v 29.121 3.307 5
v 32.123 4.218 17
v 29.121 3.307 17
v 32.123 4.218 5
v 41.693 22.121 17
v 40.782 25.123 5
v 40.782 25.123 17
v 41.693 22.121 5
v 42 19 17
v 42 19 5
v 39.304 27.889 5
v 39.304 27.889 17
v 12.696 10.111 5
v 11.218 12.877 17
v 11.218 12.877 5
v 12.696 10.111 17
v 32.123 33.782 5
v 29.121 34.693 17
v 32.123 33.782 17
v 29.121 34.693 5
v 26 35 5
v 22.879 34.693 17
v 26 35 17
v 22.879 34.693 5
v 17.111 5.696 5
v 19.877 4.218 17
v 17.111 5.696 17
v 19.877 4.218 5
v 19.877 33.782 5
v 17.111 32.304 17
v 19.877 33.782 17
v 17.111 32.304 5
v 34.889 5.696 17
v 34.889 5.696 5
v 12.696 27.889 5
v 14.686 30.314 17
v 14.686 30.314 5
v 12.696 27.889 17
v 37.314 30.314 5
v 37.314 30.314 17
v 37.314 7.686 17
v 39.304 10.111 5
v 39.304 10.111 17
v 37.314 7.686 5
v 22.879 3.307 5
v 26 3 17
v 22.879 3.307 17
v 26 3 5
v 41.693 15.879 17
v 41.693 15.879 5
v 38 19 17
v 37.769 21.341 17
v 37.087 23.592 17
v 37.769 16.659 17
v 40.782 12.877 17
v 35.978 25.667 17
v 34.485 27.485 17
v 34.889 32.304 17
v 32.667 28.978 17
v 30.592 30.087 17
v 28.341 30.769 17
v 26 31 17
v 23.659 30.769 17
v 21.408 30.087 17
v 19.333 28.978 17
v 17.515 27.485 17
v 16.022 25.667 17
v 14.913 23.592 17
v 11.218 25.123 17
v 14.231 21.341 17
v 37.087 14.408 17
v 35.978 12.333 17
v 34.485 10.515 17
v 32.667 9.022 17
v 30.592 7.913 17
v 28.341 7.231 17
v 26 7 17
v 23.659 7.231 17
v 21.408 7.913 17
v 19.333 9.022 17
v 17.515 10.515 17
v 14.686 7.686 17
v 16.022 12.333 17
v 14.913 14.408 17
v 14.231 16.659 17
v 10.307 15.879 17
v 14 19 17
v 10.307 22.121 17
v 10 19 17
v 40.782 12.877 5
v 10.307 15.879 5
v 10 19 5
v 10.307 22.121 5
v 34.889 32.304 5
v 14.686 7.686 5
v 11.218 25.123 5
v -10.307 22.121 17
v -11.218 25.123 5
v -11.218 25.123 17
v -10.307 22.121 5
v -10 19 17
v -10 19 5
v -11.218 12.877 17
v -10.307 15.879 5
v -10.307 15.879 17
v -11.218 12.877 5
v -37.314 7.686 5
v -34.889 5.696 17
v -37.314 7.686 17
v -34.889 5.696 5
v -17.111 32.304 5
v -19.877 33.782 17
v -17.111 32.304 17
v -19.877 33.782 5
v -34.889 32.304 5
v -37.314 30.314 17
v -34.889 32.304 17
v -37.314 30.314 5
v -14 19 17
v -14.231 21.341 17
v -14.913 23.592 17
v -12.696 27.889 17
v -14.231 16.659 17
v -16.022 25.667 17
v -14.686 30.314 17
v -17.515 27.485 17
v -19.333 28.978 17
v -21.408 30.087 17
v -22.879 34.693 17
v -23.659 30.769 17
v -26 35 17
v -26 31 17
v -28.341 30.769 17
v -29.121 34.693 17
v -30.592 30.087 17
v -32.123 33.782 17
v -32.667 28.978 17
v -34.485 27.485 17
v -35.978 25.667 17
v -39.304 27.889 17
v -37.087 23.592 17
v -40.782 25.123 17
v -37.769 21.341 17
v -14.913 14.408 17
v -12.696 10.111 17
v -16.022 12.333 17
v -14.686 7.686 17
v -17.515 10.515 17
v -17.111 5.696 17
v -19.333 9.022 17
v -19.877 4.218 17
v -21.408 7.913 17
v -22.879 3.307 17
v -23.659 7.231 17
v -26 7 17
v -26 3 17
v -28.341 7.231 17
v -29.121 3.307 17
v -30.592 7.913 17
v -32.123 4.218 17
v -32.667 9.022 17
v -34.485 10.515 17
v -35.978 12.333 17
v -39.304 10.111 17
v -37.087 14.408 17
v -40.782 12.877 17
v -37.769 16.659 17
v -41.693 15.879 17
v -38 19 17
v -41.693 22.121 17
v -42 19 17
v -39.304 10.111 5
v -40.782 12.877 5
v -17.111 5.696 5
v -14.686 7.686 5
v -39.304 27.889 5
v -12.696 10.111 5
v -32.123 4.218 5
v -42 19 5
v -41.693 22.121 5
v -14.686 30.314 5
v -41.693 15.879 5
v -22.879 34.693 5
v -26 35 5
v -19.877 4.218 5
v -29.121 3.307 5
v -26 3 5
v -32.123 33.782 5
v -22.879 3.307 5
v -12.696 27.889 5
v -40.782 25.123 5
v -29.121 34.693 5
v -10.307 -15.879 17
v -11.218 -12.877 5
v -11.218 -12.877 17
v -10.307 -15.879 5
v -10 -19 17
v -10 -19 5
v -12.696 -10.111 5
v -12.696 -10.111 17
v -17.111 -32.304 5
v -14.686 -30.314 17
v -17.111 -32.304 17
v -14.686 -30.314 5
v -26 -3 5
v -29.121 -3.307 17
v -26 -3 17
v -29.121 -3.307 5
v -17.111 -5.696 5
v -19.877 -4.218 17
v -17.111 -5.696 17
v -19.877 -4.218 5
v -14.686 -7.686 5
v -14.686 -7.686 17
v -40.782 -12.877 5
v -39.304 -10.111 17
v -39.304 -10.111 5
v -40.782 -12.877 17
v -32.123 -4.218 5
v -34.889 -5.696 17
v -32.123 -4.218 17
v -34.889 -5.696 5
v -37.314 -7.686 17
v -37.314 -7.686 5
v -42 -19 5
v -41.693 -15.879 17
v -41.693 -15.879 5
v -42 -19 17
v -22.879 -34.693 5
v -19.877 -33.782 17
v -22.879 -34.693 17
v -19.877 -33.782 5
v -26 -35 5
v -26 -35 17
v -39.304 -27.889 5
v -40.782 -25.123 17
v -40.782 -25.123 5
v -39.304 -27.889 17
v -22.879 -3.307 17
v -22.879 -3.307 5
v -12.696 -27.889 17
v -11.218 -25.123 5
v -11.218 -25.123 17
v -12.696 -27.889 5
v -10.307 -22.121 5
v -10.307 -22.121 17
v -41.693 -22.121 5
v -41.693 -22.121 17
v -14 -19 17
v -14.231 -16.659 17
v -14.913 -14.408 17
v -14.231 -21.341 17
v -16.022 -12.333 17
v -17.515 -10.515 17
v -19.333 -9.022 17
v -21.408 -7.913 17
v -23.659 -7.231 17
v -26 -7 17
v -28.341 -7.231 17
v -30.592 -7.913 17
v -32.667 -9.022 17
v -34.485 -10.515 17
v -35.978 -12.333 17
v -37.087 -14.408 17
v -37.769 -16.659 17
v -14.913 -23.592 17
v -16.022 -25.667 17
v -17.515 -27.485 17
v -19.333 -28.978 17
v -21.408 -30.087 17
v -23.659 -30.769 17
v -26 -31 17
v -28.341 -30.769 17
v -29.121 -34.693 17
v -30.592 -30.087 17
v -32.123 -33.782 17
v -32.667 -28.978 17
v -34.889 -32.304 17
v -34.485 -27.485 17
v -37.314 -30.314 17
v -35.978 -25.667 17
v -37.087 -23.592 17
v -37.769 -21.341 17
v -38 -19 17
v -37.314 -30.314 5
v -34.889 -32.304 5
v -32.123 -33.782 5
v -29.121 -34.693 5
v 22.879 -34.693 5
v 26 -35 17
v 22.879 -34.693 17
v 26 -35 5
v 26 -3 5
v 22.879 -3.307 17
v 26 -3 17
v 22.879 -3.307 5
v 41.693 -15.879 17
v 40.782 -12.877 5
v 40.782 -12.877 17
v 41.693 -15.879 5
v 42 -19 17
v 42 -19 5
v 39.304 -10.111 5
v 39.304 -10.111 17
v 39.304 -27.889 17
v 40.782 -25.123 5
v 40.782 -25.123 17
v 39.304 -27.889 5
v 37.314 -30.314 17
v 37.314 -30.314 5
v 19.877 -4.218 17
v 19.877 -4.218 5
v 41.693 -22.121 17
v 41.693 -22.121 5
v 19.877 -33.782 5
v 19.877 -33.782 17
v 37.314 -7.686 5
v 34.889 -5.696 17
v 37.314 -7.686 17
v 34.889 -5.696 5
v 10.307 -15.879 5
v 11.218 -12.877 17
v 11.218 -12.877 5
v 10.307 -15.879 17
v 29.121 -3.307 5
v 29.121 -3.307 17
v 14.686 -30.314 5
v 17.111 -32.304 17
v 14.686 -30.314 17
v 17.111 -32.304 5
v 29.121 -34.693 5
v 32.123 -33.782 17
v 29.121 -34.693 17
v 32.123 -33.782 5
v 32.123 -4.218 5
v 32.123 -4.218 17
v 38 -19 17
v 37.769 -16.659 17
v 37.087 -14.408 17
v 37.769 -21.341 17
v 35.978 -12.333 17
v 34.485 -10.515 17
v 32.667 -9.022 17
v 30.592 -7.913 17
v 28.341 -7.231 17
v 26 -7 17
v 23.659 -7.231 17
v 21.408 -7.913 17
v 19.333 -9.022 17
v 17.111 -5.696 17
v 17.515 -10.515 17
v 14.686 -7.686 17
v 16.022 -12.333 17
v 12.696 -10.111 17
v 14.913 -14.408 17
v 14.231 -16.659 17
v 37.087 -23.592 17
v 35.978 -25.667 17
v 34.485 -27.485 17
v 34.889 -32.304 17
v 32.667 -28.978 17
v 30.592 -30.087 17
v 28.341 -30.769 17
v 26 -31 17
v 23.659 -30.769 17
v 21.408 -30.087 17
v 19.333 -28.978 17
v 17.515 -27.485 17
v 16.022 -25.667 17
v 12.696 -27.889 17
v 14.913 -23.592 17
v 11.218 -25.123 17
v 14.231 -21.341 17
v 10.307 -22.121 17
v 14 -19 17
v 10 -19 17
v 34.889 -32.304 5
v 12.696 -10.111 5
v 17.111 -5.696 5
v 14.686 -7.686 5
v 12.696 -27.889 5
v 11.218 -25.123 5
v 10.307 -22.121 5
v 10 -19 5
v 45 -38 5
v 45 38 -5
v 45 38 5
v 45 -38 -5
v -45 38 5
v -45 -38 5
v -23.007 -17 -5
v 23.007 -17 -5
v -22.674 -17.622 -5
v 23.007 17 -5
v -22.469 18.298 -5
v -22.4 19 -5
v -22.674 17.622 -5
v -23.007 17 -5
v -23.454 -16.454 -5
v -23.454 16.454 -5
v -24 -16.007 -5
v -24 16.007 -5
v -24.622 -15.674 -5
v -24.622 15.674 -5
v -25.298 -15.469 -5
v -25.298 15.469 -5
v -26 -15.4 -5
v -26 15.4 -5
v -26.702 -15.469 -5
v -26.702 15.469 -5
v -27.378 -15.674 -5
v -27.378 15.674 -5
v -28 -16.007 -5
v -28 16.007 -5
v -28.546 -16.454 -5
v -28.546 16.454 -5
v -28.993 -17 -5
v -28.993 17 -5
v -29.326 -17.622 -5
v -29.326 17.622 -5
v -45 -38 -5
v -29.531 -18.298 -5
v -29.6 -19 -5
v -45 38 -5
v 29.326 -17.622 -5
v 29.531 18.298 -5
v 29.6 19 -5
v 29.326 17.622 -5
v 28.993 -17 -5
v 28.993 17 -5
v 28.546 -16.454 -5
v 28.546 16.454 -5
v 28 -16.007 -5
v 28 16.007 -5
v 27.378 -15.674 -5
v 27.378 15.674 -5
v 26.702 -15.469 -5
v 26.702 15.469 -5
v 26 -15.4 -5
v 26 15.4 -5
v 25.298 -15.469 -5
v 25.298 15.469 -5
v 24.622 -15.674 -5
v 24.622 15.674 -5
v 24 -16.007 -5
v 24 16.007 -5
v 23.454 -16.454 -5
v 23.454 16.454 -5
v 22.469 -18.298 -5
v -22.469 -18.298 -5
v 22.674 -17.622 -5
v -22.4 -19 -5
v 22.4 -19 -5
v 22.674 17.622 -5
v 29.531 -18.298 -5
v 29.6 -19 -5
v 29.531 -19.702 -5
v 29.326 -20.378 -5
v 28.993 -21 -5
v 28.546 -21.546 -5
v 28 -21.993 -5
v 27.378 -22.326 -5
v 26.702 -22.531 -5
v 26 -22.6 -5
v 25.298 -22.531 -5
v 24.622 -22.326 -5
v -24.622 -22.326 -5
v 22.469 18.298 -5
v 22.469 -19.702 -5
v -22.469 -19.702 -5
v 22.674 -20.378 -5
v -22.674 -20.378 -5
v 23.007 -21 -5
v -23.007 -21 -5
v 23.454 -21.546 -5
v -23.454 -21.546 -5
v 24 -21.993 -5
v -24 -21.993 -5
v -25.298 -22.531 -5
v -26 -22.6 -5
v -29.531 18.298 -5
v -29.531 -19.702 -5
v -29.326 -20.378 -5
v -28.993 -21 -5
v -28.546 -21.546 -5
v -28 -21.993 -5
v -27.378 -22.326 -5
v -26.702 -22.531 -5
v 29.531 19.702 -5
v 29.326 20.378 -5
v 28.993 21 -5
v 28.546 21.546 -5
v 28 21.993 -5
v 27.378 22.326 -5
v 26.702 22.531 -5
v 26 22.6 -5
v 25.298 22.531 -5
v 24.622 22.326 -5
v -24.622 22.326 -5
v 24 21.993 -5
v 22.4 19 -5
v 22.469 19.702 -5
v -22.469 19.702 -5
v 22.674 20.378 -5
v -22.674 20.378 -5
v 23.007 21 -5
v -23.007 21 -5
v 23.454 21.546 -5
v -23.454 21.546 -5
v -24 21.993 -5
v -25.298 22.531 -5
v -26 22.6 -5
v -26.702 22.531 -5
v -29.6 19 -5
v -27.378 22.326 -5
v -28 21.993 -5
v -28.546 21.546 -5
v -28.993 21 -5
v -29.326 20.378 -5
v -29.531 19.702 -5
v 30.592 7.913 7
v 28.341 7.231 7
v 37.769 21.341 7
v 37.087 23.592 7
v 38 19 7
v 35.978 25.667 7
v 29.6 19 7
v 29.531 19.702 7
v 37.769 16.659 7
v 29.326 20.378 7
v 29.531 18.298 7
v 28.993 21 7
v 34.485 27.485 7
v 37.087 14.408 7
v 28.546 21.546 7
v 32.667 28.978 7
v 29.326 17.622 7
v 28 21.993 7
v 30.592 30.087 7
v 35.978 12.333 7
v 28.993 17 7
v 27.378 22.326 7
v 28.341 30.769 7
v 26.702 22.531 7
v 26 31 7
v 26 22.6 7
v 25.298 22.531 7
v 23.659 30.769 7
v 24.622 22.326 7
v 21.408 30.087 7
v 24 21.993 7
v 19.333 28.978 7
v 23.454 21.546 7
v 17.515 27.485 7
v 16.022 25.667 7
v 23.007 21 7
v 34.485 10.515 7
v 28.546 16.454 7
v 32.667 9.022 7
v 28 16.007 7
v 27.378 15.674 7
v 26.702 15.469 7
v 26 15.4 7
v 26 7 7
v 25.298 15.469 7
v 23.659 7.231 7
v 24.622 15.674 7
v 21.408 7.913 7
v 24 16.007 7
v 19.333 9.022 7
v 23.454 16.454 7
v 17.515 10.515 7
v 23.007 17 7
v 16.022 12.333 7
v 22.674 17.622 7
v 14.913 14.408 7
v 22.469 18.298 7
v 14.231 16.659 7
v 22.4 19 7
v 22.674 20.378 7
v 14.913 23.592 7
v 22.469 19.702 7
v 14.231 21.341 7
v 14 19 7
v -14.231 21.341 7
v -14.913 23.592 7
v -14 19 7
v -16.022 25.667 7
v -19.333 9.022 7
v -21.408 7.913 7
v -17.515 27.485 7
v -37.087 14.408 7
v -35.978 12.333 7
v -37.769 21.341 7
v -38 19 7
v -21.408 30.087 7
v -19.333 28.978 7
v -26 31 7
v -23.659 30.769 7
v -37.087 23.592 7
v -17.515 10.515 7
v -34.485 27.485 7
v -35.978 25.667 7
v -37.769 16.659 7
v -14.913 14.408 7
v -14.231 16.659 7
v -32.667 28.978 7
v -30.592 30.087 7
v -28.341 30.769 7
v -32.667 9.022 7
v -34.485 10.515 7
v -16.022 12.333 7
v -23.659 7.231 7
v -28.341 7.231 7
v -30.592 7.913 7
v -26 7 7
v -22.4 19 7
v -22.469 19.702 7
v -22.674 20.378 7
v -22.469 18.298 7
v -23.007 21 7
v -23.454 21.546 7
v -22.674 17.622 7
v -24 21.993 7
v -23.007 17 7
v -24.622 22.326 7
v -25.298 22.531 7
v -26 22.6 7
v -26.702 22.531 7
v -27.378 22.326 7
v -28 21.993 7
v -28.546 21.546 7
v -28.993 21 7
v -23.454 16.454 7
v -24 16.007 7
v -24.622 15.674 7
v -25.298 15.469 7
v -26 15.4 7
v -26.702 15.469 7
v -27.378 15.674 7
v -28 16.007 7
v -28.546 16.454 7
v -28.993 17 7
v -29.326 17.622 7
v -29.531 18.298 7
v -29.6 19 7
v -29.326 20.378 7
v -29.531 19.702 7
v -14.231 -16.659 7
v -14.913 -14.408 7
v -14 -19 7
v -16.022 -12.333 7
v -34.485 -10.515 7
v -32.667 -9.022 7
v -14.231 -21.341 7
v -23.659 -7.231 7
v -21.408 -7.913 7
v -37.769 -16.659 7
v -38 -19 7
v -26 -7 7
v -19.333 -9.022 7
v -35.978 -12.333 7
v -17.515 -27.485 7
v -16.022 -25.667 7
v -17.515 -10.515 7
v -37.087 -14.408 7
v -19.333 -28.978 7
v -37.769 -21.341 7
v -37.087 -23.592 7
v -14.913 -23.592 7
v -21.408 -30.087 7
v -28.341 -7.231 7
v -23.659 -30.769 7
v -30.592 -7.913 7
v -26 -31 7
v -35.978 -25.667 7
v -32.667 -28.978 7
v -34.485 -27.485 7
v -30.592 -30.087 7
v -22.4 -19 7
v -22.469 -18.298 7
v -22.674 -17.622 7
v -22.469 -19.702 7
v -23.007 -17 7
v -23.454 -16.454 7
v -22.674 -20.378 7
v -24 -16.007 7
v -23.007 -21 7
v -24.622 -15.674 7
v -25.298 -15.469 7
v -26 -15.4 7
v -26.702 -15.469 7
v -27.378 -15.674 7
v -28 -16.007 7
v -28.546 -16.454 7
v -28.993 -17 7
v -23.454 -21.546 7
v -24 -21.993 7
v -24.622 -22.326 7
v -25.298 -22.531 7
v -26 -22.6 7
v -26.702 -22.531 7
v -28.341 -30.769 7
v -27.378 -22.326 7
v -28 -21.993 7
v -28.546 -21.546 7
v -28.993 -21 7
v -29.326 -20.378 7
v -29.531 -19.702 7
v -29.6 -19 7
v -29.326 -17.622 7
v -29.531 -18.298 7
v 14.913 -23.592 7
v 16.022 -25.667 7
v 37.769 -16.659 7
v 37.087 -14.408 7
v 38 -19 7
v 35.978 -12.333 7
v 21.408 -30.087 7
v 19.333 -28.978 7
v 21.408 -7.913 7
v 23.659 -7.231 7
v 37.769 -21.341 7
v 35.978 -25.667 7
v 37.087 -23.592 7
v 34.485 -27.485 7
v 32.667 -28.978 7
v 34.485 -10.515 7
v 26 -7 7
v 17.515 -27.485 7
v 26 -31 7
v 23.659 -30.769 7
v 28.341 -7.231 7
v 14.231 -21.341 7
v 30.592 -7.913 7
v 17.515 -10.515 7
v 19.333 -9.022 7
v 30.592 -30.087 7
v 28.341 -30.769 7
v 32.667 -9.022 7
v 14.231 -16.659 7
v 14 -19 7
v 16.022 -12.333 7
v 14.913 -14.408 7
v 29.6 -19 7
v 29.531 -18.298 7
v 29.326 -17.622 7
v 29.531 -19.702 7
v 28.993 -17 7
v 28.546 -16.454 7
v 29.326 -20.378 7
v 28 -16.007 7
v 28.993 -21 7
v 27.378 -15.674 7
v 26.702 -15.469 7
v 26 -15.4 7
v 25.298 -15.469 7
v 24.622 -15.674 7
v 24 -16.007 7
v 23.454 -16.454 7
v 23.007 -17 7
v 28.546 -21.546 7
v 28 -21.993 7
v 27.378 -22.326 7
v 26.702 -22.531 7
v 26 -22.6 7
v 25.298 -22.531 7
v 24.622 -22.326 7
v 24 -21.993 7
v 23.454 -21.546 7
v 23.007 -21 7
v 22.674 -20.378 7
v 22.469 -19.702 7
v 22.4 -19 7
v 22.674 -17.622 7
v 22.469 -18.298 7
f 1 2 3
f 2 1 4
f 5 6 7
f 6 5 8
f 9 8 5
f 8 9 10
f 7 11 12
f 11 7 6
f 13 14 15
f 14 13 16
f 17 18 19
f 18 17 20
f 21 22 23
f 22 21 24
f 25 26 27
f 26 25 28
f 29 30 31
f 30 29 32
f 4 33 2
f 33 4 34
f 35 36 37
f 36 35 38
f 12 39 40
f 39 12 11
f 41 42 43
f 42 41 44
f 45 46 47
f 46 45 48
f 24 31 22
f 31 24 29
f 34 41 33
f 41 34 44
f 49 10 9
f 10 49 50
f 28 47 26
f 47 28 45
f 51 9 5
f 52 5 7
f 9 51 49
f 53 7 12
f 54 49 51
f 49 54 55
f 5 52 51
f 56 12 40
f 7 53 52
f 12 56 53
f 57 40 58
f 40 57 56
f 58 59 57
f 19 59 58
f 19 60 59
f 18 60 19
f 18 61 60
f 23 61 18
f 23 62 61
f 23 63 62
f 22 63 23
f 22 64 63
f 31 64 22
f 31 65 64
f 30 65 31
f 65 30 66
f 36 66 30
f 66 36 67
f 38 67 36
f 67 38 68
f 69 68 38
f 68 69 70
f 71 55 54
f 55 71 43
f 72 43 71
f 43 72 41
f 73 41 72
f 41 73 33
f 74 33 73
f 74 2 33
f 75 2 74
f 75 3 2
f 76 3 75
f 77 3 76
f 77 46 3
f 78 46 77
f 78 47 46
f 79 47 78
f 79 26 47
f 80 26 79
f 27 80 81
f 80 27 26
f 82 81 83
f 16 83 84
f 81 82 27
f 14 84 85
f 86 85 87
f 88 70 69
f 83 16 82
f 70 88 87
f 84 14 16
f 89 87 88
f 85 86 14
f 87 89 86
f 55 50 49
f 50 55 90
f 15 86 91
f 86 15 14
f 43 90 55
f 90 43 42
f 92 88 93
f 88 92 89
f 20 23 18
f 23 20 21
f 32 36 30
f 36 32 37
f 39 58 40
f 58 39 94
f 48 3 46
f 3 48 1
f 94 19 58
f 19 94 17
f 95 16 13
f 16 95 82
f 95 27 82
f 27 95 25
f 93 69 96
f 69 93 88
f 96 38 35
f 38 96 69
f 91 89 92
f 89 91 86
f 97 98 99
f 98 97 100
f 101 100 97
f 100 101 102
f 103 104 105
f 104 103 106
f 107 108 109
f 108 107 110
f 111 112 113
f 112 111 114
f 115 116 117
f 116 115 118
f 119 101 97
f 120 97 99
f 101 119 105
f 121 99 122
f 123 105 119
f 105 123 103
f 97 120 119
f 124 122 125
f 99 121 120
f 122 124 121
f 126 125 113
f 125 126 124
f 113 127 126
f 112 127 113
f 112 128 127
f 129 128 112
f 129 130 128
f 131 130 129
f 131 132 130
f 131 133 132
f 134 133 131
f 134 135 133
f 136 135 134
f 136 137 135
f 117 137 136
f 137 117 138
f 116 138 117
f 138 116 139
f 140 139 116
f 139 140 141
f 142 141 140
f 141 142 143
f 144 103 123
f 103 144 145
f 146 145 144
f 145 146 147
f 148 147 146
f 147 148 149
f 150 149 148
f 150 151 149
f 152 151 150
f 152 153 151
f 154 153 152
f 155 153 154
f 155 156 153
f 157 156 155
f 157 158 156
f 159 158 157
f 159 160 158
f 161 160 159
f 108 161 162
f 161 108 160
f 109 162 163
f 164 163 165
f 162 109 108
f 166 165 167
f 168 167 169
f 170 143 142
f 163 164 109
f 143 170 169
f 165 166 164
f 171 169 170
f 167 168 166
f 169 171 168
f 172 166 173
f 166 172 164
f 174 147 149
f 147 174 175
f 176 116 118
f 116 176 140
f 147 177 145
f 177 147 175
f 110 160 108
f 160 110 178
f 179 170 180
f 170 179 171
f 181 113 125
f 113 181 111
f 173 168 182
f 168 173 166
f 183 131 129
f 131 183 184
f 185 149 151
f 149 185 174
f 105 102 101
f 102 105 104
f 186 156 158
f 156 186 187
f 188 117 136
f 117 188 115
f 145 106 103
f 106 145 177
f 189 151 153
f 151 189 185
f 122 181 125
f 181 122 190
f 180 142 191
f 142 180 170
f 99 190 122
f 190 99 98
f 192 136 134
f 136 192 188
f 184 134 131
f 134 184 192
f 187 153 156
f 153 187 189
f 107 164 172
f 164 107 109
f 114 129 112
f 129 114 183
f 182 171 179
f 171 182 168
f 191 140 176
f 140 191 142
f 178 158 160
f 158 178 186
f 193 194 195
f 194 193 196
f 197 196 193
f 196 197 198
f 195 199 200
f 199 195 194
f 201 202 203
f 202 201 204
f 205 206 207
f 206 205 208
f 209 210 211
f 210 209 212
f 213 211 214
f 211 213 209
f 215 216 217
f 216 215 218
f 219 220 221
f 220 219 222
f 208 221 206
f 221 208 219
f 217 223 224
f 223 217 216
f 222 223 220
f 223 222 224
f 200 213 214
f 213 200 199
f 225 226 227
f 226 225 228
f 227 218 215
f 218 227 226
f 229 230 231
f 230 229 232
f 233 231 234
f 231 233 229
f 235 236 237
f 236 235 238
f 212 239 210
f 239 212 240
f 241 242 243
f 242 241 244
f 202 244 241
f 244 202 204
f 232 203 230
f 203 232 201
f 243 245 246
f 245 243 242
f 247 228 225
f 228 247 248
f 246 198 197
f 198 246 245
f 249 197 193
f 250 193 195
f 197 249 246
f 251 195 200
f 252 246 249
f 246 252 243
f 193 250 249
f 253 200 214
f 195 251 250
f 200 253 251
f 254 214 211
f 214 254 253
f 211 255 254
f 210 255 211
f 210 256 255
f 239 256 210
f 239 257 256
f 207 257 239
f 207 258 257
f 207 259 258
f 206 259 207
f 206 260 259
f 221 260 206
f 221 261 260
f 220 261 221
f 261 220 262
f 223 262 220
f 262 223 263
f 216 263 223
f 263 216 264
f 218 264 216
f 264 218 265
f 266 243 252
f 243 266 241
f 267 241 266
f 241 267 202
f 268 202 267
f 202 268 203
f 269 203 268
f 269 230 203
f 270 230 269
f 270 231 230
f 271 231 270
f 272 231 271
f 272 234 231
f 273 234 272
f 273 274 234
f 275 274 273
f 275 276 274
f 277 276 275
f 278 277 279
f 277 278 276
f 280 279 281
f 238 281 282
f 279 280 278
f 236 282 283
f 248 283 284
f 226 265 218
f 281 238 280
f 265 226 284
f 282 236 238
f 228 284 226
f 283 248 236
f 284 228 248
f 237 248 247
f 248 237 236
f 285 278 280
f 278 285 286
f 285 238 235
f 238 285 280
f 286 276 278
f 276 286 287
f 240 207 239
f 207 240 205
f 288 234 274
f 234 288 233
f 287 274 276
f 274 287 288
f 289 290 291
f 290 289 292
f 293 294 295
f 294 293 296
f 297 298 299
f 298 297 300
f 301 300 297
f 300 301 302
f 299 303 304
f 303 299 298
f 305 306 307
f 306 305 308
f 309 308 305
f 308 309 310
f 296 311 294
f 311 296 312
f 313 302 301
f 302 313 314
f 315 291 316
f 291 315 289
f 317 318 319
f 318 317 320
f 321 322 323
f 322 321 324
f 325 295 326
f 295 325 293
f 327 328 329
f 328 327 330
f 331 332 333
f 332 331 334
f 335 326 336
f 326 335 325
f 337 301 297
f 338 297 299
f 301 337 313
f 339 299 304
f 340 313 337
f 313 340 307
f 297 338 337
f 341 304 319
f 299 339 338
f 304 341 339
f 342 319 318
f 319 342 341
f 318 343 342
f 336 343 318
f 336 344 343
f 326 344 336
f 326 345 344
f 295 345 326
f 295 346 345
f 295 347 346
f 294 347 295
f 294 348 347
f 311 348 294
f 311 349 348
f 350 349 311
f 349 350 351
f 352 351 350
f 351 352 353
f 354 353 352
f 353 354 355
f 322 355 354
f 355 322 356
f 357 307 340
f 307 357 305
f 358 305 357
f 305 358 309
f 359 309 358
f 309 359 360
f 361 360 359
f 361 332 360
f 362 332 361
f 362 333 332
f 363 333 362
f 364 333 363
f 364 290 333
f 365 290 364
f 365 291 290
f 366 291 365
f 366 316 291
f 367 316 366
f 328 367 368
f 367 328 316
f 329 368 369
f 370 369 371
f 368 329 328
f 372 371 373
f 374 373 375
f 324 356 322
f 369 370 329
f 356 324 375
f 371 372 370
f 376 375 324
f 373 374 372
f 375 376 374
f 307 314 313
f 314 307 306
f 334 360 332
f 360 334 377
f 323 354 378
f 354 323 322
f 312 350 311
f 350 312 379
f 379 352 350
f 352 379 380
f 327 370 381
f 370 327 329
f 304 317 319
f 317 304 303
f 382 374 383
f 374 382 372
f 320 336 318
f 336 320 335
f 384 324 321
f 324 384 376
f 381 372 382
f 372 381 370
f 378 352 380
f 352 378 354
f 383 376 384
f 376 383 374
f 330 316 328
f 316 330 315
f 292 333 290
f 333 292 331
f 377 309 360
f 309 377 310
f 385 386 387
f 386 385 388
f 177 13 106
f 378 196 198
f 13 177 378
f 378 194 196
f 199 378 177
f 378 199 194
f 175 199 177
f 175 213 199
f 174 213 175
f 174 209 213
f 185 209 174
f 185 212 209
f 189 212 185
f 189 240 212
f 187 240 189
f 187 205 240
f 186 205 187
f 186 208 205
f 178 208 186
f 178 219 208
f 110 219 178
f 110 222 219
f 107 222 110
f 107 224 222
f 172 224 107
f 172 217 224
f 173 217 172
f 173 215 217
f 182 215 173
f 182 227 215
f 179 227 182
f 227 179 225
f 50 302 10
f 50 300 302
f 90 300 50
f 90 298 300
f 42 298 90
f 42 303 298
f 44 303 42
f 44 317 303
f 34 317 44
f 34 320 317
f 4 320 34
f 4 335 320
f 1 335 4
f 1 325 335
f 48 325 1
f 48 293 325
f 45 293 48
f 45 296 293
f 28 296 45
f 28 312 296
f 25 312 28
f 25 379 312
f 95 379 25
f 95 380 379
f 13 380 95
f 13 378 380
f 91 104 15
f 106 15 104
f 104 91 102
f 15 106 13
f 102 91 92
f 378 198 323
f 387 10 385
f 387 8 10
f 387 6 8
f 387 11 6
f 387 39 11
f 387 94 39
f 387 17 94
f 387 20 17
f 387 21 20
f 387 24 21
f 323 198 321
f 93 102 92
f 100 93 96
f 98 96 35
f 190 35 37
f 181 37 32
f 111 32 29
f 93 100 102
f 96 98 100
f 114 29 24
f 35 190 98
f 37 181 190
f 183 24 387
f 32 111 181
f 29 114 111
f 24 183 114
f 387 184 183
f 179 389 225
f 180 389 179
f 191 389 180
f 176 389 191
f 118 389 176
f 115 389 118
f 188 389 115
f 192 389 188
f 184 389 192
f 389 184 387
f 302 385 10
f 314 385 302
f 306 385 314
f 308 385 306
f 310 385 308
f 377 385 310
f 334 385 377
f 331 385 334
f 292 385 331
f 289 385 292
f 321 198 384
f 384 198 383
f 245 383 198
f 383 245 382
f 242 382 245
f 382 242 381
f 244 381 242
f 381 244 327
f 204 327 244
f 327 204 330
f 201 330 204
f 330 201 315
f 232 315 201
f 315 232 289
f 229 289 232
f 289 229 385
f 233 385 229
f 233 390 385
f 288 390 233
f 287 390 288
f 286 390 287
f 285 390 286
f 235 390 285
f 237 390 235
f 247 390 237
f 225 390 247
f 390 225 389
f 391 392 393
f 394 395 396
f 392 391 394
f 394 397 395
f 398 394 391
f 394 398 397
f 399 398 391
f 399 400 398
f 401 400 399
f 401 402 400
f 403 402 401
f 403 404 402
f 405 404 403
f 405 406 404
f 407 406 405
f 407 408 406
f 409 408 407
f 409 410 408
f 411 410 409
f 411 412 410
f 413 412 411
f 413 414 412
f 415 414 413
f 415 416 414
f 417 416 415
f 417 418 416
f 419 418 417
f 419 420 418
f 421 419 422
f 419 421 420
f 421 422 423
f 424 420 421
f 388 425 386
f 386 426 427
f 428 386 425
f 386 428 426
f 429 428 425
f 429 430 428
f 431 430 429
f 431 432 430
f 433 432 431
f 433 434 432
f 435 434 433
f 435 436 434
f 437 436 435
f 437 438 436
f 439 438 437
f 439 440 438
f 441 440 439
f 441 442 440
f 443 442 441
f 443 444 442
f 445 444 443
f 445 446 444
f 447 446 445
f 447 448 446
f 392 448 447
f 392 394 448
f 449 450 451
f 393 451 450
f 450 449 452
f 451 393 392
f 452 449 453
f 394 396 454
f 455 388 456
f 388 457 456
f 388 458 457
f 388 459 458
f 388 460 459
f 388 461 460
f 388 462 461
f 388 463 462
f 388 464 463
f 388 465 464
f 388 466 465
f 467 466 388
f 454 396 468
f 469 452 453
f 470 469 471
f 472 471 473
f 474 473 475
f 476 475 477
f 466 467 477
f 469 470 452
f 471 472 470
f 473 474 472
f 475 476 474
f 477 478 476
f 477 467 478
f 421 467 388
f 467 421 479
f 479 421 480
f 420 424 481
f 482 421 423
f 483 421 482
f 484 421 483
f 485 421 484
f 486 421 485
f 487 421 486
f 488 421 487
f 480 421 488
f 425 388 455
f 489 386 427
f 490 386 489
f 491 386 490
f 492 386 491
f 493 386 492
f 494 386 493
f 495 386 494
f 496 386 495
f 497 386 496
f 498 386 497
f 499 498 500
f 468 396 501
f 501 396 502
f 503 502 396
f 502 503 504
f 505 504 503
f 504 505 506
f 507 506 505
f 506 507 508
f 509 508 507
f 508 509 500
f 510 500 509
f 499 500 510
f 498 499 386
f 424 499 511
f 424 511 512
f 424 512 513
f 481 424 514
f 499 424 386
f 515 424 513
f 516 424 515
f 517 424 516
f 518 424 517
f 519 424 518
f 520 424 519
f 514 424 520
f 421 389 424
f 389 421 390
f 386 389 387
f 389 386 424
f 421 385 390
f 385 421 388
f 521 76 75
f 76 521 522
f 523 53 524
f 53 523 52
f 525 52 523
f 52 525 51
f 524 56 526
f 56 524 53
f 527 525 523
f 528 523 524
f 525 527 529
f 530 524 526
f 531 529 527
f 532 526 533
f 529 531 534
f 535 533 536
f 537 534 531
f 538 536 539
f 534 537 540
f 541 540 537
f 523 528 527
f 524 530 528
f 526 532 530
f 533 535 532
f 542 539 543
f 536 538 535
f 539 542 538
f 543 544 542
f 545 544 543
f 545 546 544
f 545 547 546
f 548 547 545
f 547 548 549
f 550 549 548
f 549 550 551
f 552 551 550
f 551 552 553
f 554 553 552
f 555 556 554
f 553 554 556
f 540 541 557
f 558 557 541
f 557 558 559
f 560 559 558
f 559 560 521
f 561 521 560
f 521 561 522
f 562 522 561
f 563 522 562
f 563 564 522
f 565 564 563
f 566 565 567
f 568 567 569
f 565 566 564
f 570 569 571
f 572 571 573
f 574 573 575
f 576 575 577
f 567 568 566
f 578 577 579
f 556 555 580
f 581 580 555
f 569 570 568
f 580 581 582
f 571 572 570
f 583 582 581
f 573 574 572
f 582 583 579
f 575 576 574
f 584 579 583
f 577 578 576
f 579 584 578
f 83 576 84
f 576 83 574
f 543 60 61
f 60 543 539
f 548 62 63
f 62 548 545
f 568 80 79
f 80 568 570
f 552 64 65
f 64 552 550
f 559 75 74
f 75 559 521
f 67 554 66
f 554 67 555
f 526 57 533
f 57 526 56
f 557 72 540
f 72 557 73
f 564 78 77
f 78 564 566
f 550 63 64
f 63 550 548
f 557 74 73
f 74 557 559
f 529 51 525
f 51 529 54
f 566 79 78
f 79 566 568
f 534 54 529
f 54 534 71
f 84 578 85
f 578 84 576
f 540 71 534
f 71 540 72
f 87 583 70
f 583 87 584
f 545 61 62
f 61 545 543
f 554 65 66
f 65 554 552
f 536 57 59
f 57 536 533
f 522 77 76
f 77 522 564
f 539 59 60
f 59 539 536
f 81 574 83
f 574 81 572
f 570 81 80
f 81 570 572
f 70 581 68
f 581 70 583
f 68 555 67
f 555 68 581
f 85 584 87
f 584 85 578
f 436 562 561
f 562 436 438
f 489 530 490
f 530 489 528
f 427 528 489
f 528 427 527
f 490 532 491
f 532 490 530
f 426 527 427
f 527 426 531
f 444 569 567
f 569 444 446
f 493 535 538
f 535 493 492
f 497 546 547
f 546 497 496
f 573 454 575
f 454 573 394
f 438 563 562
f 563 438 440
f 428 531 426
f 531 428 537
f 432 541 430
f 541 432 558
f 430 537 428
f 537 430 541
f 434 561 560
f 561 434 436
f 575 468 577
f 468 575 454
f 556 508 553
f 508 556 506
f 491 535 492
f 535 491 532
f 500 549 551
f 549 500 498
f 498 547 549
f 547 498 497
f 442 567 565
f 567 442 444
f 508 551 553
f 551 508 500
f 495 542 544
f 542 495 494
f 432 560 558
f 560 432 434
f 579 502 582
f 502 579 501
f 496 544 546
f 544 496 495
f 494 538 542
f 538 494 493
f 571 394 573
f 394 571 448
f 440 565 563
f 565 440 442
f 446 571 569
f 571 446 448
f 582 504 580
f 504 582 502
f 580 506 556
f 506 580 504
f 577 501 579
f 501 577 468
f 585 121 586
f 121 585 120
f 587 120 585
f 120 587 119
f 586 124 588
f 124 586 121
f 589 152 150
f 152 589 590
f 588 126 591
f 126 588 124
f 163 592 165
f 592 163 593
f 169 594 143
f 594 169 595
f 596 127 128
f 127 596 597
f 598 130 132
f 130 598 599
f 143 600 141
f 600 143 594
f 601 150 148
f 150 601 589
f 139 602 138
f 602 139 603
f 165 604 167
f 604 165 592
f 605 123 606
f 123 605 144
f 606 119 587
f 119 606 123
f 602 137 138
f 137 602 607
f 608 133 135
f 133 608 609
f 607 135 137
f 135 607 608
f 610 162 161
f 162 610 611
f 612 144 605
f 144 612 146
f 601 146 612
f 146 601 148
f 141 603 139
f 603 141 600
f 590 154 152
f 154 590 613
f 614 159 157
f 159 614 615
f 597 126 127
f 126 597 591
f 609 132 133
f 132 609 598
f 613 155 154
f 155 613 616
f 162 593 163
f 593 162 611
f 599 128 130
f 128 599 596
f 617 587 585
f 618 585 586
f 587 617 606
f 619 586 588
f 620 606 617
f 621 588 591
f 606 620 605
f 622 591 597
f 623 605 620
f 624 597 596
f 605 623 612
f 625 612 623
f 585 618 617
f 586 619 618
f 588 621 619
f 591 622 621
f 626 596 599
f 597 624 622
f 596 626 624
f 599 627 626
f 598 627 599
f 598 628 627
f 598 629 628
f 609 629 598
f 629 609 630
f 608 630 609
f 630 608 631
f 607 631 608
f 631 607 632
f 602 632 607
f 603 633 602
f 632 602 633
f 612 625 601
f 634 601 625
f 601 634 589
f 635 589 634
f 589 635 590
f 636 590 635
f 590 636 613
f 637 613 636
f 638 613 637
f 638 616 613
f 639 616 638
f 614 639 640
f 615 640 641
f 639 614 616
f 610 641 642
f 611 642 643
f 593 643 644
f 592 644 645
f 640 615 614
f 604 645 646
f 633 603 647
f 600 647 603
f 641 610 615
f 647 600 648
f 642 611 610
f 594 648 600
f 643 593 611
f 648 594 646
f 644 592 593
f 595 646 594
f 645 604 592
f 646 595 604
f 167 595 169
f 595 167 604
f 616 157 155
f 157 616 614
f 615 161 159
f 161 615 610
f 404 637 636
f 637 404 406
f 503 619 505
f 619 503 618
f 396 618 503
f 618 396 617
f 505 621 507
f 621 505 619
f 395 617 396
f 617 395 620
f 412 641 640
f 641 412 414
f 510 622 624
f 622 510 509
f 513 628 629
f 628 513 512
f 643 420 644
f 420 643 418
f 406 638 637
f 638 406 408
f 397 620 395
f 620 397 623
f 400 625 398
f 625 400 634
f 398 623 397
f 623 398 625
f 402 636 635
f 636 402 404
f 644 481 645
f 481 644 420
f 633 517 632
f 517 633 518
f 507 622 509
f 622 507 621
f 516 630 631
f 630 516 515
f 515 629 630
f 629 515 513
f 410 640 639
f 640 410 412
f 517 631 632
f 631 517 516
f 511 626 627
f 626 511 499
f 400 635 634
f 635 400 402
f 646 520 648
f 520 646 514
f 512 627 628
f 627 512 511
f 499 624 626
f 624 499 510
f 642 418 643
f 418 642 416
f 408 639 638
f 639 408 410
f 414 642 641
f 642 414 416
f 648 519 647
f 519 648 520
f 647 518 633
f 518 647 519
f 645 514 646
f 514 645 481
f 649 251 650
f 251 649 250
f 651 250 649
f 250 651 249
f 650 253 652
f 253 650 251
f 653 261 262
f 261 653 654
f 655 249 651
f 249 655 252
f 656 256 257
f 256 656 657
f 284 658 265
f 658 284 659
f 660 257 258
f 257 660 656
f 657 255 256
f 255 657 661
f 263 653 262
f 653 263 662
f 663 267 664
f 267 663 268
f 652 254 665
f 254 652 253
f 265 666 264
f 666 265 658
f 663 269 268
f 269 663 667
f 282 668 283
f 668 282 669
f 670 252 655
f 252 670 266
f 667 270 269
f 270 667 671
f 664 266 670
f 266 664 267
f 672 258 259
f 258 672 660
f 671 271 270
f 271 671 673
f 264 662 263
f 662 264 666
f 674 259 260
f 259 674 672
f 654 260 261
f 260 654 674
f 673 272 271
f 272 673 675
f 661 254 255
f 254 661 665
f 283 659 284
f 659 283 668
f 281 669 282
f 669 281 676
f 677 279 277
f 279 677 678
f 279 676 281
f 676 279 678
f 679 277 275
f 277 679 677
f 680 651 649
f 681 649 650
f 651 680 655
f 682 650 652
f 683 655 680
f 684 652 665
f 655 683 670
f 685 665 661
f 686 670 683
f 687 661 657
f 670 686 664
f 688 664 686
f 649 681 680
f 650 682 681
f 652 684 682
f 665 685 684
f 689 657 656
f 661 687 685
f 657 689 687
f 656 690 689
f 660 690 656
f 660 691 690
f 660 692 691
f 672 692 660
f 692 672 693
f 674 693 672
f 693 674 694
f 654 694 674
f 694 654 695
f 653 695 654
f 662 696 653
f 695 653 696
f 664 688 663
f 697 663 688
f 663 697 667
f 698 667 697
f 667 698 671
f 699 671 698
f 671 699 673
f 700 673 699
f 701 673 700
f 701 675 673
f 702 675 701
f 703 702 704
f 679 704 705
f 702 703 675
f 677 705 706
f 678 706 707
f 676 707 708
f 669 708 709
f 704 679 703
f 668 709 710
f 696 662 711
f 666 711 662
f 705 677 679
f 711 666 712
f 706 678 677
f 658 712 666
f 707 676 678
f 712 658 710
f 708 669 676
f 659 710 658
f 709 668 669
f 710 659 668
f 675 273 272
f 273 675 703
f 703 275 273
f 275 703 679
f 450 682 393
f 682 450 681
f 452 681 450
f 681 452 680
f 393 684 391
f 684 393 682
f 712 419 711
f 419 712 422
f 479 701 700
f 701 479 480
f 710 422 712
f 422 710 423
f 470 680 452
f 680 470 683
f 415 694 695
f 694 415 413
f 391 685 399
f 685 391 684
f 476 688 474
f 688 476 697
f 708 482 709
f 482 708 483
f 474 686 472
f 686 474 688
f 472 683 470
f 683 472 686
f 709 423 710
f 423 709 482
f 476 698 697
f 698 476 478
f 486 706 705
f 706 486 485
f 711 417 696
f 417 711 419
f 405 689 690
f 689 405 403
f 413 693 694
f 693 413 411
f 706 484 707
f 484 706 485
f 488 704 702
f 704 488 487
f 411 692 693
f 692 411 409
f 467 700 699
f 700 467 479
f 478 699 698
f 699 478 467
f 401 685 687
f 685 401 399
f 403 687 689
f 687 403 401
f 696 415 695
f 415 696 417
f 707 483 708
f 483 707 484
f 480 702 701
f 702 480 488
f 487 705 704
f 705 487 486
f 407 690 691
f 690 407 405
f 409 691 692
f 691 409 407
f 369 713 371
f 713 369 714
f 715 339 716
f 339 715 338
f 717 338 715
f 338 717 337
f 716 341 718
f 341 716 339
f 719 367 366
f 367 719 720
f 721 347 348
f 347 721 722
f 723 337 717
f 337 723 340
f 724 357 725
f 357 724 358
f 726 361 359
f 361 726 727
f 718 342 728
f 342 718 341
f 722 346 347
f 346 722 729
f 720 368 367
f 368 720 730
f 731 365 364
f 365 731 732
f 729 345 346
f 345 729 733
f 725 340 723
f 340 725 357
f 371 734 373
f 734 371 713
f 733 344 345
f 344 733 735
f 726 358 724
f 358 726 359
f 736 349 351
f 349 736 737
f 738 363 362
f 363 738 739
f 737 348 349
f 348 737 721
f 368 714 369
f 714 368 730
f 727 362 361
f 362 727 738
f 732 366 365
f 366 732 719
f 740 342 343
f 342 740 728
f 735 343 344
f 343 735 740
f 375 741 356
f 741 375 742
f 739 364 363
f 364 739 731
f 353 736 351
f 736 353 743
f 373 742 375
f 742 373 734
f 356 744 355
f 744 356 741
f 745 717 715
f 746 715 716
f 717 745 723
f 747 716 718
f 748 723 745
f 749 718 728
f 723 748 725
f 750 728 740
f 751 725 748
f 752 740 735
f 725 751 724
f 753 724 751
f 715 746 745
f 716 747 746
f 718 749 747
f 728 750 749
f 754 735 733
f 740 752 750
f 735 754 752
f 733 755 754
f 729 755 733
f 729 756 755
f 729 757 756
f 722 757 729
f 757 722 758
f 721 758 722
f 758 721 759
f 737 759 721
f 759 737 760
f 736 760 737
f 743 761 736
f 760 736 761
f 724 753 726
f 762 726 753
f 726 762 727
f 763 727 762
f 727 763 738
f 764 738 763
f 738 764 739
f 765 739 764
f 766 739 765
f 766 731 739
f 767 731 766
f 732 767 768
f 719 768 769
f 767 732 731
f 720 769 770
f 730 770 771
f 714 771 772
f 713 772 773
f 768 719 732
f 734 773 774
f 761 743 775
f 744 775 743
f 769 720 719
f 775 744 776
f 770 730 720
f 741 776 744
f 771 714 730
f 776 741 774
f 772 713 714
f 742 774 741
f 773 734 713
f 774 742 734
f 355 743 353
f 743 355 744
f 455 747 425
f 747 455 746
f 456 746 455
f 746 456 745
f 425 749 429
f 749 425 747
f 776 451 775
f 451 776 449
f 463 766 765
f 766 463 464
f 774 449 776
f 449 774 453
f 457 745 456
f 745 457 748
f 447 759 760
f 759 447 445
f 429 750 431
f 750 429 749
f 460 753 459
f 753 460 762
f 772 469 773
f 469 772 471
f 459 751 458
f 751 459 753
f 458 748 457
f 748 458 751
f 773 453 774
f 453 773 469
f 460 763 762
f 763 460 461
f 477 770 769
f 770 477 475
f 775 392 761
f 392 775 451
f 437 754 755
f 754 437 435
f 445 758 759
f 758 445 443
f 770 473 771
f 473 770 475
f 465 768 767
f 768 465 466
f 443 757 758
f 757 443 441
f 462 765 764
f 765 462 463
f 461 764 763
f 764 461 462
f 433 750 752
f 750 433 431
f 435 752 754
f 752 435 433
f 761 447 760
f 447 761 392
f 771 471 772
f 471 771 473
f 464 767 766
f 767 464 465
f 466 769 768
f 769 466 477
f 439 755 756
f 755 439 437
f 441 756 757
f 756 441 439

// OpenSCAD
$fn = 32;

// ----------------------------------------------------------------------
// Socket pad plate
// bosses with counterbored sockets for the screws
// ----------------------------------------------------------------------

// --- parameters (mm) ---
base_t = 10;           // base plate thickness
boss_h = 12;           // boss height above the base plate
boss_d = 32;           // boss diameter
socket_d = 24;         // socket diameter
socket_depth = 10;     // socket depth from the boss face
bolt_d = 7.2;          // screw clearance hole through the socket floor
plate = [90, 76, 10];  // overall size (x, y, z)
edge = 19;             // boss centre offset from the plate edge
pads = 4;              // boss count, one per corner

// --- derived feature positions (mm) ---
height = base_t + boss_h;        // = 22   overall height of the part
corner_x = plate[0] / 2 - edge;  // = 26   boss centre X
corner_y = plate[1] / 2 - edge;  // = 19   boss centre Y
feature_centers = [
  [corner_x, corner_y],
  [-corner_x, corner_y],
  [-corner_x, -corner_y],
  [corner_x, -corner_y]
];   // boss centres: sockets, holes and the pads themselves are placed from here

// base plate, bosses on feature_centers, socket + through hole in each
difference() {
  union() {
    cube(plate, center = true);
    for (centre = feature_centers)
      translate([centre[0], centre[1], plate[2] / 2 - 1])
        cylinder(d = boss_d, h = boss_h + 1);
  }
  for (centre = feature_centers) {
    translate([centre[0], centre[1], plate[2] / 2 + boss_h - socket_depth])
      cylinder(d = socket_d, h = socket_depth + 1);
    translate([centre[0], centre[1], -height])
      cylinder(d = bolt_d, h = 2 * height + 2);  // through the socket floor
  }
}
